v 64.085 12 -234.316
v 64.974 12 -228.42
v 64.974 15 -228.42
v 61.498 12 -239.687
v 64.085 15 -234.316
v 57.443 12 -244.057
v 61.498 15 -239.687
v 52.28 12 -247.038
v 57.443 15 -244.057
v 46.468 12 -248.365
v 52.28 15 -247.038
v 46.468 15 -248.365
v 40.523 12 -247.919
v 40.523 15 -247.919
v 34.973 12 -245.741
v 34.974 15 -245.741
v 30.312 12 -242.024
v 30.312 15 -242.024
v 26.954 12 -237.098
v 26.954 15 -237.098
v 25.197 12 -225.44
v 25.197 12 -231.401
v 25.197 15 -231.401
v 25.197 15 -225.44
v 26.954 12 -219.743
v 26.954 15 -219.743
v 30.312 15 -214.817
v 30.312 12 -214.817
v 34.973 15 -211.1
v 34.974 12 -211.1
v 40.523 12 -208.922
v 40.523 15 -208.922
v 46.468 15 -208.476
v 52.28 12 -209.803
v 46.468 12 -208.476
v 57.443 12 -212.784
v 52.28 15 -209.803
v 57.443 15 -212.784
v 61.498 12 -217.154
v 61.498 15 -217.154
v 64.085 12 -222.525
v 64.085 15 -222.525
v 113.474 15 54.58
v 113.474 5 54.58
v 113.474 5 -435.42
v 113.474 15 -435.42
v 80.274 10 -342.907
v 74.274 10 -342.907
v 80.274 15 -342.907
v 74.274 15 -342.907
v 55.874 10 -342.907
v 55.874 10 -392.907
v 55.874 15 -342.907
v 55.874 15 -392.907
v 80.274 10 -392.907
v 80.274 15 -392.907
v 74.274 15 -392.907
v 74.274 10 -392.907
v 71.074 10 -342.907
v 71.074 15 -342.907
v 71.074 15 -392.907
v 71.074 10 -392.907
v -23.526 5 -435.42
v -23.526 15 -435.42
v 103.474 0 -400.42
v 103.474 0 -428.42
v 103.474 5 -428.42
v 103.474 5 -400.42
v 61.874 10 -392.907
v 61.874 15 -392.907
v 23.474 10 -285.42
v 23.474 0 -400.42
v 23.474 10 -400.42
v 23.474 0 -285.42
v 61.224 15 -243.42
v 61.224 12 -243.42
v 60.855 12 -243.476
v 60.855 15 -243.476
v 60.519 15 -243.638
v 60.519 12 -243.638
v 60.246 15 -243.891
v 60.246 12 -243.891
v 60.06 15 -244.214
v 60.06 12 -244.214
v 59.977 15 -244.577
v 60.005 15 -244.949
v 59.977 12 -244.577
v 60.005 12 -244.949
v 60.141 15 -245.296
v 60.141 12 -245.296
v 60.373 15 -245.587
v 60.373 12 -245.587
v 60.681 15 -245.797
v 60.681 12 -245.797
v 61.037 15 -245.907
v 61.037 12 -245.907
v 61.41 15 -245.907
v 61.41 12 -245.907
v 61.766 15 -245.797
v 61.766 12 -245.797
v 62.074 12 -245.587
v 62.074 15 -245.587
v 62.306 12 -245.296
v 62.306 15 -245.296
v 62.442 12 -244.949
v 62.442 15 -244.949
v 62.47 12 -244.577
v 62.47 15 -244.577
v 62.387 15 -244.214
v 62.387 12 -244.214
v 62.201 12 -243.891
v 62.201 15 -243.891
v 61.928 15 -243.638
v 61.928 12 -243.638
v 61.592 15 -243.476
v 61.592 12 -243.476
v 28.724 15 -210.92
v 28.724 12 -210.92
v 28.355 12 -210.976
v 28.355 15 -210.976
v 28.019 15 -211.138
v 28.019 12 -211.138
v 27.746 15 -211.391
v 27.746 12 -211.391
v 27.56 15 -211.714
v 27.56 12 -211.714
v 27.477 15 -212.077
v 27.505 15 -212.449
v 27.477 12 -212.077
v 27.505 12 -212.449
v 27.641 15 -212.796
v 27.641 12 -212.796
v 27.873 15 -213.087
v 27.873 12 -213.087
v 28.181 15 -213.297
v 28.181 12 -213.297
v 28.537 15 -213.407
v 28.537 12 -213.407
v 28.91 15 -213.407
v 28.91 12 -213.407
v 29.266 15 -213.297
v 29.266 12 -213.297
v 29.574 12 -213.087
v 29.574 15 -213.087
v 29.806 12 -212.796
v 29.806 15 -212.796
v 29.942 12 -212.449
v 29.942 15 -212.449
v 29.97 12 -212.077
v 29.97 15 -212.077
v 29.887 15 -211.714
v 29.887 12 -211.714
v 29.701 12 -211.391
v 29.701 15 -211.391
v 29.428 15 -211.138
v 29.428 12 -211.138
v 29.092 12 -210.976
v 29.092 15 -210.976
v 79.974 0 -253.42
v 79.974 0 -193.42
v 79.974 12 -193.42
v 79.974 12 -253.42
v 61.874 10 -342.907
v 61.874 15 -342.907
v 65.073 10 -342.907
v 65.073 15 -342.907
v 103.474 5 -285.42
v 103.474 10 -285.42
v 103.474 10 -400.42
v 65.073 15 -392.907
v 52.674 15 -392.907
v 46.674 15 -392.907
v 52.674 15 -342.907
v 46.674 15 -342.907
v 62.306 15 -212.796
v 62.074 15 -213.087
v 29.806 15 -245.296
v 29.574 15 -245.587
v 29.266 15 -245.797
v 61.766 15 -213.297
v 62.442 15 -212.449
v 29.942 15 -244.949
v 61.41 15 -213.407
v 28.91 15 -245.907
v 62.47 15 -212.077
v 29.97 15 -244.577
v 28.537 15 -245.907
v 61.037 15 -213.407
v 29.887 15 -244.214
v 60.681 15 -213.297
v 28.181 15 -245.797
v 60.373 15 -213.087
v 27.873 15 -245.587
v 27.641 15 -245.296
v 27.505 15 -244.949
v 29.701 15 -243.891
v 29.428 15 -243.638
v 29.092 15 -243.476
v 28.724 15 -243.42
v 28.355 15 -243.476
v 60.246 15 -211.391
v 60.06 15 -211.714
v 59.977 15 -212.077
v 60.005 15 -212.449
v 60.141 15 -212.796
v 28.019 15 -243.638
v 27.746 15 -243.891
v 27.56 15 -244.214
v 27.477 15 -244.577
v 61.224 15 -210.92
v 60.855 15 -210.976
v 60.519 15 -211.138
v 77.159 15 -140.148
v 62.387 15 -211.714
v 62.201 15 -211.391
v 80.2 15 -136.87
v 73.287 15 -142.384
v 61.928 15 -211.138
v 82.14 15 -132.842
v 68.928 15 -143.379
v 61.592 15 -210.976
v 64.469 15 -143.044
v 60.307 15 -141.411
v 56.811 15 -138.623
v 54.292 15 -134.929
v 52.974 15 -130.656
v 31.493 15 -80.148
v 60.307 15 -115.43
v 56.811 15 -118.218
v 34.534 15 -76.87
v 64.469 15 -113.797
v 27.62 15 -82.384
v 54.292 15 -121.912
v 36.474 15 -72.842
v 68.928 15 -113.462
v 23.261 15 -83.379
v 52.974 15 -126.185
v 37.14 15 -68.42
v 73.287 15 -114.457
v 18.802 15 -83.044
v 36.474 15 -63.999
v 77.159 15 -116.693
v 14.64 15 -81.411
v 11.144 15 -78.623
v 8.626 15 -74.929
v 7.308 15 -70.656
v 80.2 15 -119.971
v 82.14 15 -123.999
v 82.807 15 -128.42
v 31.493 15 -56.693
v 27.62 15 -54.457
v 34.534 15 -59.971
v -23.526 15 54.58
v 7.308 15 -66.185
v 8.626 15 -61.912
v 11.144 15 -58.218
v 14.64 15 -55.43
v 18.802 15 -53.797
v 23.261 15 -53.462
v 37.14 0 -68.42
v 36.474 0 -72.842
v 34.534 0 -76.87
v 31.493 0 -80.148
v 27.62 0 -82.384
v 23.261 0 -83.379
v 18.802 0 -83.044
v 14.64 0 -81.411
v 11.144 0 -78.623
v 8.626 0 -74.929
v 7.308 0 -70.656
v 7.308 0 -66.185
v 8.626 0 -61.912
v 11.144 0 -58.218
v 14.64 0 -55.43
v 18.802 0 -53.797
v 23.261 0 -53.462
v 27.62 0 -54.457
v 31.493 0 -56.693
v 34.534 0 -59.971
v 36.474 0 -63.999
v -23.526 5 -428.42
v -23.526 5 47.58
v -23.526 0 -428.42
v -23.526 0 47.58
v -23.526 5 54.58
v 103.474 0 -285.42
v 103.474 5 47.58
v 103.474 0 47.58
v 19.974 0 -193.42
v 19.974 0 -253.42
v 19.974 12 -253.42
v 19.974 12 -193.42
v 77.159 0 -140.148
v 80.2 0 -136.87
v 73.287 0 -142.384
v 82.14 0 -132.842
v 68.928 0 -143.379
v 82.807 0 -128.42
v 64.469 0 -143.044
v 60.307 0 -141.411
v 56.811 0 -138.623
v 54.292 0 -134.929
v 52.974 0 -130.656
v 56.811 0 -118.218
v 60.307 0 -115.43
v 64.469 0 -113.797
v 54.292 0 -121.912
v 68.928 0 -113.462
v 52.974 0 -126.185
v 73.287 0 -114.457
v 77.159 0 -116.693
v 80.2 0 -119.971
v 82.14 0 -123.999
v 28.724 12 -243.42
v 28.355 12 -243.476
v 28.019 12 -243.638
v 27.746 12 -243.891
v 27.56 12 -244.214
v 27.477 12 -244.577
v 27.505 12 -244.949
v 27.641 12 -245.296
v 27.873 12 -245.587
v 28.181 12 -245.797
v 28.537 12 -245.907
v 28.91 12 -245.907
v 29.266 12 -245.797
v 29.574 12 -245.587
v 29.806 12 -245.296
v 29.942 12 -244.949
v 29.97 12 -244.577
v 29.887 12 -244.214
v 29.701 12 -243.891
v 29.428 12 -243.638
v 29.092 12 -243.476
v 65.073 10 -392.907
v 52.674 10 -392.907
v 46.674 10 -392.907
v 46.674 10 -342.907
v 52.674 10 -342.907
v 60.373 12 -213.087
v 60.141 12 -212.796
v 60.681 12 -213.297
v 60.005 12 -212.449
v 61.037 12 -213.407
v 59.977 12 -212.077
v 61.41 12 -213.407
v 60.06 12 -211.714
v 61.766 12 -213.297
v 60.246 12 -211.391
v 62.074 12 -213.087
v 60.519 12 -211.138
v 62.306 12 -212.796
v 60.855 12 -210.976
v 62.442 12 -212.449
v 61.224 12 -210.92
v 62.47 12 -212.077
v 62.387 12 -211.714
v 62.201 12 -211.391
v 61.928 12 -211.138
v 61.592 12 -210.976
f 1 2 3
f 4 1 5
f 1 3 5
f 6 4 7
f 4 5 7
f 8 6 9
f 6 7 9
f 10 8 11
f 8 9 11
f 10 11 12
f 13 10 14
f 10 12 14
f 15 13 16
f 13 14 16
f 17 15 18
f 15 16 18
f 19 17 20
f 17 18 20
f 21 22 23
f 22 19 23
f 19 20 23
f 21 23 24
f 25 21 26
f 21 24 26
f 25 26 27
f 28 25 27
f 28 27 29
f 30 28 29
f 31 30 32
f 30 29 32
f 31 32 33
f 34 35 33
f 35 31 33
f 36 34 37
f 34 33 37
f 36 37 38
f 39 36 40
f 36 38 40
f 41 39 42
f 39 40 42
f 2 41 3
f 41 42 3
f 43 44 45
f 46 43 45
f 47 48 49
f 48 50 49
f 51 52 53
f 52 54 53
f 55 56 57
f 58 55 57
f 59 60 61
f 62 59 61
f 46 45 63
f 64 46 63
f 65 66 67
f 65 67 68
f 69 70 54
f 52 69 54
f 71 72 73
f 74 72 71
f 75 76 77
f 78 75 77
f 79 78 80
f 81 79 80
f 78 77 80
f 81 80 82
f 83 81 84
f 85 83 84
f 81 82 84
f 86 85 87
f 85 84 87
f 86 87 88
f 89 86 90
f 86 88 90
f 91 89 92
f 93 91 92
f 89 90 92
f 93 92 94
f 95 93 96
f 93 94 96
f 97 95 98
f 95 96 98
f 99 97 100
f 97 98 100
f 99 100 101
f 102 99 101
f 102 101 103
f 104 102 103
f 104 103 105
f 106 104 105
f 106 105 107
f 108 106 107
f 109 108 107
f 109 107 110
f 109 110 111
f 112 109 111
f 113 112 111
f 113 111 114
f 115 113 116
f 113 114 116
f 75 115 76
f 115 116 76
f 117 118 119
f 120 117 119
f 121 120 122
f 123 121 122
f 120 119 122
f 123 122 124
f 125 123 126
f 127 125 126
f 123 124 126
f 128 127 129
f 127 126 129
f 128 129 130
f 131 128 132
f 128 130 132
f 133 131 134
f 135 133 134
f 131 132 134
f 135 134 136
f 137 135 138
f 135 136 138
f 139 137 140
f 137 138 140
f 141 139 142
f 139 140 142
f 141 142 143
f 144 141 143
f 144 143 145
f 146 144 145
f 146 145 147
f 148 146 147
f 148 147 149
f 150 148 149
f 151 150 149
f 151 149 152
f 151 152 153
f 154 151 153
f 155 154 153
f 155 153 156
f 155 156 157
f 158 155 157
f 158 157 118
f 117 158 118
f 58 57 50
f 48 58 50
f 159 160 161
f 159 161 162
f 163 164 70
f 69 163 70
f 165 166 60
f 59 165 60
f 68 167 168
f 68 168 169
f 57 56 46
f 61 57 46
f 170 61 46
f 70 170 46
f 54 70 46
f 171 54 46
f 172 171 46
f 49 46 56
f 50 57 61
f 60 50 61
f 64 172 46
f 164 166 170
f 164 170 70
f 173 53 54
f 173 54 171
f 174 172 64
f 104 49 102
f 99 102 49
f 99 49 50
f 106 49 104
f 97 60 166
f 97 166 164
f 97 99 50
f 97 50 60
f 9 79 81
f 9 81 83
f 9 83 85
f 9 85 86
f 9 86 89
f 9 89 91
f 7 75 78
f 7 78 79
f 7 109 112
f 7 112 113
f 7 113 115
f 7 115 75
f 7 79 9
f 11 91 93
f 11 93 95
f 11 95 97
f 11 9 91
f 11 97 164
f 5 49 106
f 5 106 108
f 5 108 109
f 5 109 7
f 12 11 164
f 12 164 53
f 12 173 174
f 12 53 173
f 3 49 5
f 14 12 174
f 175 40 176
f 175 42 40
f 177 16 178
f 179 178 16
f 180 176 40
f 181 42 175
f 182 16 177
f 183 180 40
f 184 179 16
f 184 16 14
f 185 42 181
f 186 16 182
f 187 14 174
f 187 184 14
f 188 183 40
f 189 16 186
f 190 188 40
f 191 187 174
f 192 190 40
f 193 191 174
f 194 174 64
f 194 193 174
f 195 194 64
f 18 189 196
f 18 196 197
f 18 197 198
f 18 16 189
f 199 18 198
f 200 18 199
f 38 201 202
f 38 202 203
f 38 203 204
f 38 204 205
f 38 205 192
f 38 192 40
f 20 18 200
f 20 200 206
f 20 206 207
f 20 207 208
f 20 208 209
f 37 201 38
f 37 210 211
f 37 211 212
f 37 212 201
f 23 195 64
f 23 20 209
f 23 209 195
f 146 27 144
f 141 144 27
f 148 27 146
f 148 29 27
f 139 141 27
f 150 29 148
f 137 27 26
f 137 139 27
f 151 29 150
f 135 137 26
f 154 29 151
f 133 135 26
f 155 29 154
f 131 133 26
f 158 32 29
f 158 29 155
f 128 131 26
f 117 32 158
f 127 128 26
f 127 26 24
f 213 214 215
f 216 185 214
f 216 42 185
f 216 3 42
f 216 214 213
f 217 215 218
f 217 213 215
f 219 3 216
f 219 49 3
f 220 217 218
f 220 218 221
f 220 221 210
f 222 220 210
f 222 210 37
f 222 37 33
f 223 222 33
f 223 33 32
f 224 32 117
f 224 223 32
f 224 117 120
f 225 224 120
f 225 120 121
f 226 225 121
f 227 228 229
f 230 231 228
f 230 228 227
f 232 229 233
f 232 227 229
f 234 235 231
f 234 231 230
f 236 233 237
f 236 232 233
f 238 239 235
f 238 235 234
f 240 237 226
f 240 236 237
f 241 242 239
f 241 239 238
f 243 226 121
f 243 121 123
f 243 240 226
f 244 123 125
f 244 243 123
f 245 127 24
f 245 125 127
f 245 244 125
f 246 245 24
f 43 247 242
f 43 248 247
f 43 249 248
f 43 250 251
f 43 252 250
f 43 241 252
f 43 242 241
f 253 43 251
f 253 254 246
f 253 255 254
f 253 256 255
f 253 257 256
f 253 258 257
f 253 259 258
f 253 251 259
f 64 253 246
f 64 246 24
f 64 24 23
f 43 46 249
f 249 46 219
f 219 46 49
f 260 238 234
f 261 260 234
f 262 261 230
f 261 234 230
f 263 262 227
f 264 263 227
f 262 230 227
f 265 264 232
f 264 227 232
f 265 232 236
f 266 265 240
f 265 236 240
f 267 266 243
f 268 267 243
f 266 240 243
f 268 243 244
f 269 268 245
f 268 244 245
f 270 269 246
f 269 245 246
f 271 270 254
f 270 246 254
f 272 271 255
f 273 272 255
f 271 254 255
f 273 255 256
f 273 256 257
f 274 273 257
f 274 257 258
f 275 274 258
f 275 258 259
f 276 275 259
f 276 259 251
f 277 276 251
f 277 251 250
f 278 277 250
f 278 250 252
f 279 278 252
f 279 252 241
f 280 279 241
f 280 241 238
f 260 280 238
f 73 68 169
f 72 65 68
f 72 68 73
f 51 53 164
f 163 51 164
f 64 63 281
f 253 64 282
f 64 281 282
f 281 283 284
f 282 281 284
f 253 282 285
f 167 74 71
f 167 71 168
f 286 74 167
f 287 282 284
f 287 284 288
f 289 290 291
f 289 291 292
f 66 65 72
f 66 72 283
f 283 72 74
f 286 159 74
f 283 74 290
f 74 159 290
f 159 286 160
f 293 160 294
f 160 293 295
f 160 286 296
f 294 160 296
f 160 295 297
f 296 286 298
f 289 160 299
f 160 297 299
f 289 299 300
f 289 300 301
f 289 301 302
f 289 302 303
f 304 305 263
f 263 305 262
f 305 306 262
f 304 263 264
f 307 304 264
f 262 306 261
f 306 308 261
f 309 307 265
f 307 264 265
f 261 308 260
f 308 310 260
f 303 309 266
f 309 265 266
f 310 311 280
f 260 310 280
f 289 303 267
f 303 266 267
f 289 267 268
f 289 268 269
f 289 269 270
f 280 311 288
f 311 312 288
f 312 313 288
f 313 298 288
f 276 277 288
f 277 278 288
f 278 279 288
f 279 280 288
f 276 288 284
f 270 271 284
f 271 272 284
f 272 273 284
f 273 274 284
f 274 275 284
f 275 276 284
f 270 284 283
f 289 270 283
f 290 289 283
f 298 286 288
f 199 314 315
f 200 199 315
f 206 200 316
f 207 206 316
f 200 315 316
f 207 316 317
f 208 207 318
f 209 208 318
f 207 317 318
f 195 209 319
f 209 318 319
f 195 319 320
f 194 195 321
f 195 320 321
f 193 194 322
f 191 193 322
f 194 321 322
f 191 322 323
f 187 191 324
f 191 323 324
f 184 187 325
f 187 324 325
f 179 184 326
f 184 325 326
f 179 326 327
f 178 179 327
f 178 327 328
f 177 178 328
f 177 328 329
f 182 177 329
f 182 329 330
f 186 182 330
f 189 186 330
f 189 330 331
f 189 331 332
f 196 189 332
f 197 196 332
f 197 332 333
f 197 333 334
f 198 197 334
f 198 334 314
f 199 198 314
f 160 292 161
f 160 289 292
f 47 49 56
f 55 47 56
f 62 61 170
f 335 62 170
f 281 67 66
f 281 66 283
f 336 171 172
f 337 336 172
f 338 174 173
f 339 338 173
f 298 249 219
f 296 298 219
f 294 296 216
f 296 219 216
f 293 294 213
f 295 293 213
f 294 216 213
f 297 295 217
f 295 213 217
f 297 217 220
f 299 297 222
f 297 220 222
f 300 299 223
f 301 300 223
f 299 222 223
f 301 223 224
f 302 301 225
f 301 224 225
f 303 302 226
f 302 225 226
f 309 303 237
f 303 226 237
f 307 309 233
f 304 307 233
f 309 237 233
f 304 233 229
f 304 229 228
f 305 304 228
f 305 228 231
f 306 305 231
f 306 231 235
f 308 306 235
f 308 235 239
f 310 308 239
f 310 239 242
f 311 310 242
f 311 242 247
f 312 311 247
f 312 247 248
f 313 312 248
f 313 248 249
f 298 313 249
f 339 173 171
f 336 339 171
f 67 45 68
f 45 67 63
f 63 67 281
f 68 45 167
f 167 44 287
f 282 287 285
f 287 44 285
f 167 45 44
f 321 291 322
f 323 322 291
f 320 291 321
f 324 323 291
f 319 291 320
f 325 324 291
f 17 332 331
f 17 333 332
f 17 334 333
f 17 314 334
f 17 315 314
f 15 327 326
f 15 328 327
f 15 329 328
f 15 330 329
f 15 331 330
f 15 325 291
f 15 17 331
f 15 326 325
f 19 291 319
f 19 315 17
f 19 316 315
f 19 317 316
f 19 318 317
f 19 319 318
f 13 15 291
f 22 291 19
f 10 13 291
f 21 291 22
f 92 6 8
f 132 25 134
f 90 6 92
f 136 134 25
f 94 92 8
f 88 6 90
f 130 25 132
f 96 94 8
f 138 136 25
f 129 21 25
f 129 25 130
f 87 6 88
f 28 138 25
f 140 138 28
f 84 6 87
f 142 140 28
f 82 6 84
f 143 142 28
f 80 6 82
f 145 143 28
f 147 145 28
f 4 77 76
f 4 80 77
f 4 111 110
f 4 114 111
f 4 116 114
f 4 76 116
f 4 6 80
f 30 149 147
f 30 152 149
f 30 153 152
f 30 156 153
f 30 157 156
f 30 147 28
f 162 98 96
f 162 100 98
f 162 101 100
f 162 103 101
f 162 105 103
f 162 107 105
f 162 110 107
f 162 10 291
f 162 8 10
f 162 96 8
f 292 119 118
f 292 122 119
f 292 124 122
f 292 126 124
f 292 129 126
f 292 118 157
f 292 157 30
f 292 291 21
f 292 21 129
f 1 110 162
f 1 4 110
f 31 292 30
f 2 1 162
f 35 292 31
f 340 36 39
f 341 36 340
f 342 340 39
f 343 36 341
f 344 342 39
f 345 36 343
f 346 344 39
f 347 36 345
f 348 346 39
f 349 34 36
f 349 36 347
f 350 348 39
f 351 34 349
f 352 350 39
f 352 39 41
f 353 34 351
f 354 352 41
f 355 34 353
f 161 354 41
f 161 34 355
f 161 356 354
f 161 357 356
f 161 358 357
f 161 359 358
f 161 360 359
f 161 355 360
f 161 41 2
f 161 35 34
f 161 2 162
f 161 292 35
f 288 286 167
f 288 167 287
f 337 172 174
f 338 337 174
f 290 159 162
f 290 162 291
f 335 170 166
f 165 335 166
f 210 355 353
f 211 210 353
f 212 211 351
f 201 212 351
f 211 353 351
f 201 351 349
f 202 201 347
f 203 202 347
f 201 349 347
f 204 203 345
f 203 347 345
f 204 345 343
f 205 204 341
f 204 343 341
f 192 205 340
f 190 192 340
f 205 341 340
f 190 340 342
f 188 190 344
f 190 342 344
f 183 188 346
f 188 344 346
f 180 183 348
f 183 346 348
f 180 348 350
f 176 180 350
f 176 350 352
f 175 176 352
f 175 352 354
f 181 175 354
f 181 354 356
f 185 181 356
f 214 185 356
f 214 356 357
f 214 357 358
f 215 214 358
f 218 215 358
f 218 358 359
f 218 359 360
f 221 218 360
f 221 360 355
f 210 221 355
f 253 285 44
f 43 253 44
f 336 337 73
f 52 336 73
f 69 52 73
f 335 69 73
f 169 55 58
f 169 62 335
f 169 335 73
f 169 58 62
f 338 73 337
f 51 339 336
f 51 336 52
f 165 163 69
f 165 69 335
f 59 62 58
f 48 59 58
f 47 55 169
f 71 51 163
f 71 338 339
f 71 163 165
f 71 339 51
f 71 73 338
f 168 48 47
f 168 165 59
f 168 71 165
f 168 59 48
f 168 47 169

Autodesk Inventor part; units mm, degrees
ref_plane "YZ Plane" through (0, 0, 0) normal (1, 0, 0) x (0, 1, 0)
ref_plane "XZ Plane" through (0, 0, 0) normal (0, 1, 0) x (-1, 0, 0)
ref_plane "XY Plane" through (0, 0, 0) normal (0, 0, 1) x (1, 0, 0)
sketch "Sketch1" plane through (0, 0, 0) normal (0, 1, 0) x (-1, 0, 0)
  line L0 (23.5265, 54.5795) -> (-113.4735, 54.5795)
  line L1 (-113.4735, 54.5795) -> (-113.4735, -435.4205)
  line L2 (-113.4735, -435.4205) -> (23.5265, -435.4205)
  line L3 (23.5265, -435.4205) -> (23.5265, 54.5795)
  point P0 (0, 0)
  dimension "d0" = 137
  dimension "d1" = 490
extrude "Extrusion1" add sketch "Sketch1" along normal blind 15
sketch "Sketch2" plane through (-23.5265, 0, 54.5795) normal (0, 0, 1) x (1, 0, 0)
  line L0 (137, 0) -> (0, 0) projected
  line L1 (0, 0) -> (127, 0)
  line L2 (127, 0) -> (127, 5)
  line L3 (127, 5) -> (0, 5)
  line L4 (0, 5) -> (0, 0)
  point P0 (23.5265, 0)
  dimension "d4" = 127
  dimension "d5" = 5
extrude "Extrusion2" cut sketch "Sketch2" against normal blind 7
sketch "Sketch3" plane through (113.4735, 0, -435.4205) normal (0, 0, -1) x (-1, 0, 0)
  line L0 (0, 0) -> (137, 0) projected
  line L1 (0, 0) -> (137, 0)
  line L2 (137, 0) -> (137, 5)
  line L3 (137, 5) -> (0, 5)
  line L4 (0, 5) -> (0, 0)
  point P0 (113.4735, 0)
  dimension "d8" = 137
  dimension "d9" = 5
extrude "Extrusion3" cut sketch "Sketch3" against normal blind 7
sketch "Sketch4" plane through (0, 0, 0) normal (0, -1, 0) x (1, 0, 0)
  line L0 (-23.5265, -428.4205) -> (113.4735, -428.4205) projected
  line L1 (103.4735, 47.5795) -> (-23.5265, 47.5795) projected
  line L2 (113.4735, -428.4205) -> (103.4735, -428.4205)
  line L3 (103.4735, -428.4205) -> (103.4735, 47.5795)
  line L4 (103.4735, 47.5795) -> (113.4735, 47.5795)
  line L5 (113.4735, 47.5795) -> (113.4735, -428.4205)
  point P0 (0, 0)
  point P1 (-13.5265, -428.4205)
  dimension "d12" = 10
  dimension "d13" = 476
extrude "Extrusion4" cut sketch "Sketch4" against normal blind 5
sketch "Sketch5" plane through (0, 15, 0) normal (0, 1, 0) x (1, 0, 0)
  circle A0 centre (22.1402, 68.4205) radius 15
  circle A1 centre (67.8068, 128.4205) radius 15
  circle A2 centre (44.9735, 228.4205) radius 20
  line L0 (103.4735, 428.4205) -> (-23.5265, 428.4205) projected
  line L1 (-23.5265, 435.4205) -> (-23.5265, -54.5795) projected
  point P0 (0, 0)
  point P1 (-13.5265, 428.4205)
  dimension "d16" = 40
  dimension "d17" = 200
  dimension "d18" = 68.5
  dimension "d19" = 300
  dimension "d20" = 91.3333
  dimension "d21" = 45.6667
  dimension "d22" = 360
  dimension "d23" = 30
  dimension "d24" = 30
extrude "Extrusion5" cut sketch "Sketch5" against normal blind 15
sketch "Sketch6" plane through (0, 0, 0) normal (0, -1, 0) x (1, 0, 0)
  line L0 (69.9735, -253.4205) -> (19.9735, -253.4205)
  line L1 (19.9735, -253.4205) -> (19.9735, -203.4205)
  line L2 (19.9735, -203.4205) -> (69.9735, -203.4205)
  line L3 (69.9735, -203.4205) -> (69.9735, -253.4205)
  circle A0 centre (44.9735, -228.4205) radius 20 projected
  point P0 (0, 0)
  dimension "d27" = 25
  dimension "d28" = 50
  dimension "d29" = 25
  dimension "d30" = 50
extrude "Extrusion6" cut sketch "Sketch6" against normal blind 12
sketch "Sketch7" plane through (0, 15, 0) normal (0, 1, 0) x (1, 0, 0)
  circle A0 centre (44.9735, 228.4205) radius 20 projected
  point P0 (0, 0)
  point P1 (28.7235, 212.1705)
  point P2 (28.7235, 244.6705)
  point P3 (61.2235, 244.6705)
  point P4 (61.2235, 212.1705)
  dimension "d33" = 16.25
  dimension "d34" = 16.25
  dimension "d35" = 16.25
  dimension "d36" = 16.25
  dimension "d37" = 16.25
  dimension "d38" = 16.25
  dimension "d39" = 16.25
  dimension "d40" = 16.25
hole "Hole1" at (28.7235, 15, -212.1705) at (28.7235, 15, -244.6705) at (61.2235, 15, -244.6705) at (61.2235, 15, -212.1705) direction (0, -1, 0) diameter 2.5 end through all
sketch "Sketch8" plane through (0, 0, 0) normal (0, -1, 0) x (1, 0, 0)
  circle A0 centre (61.2235, -244.6705) radius 1.25 projected
  circle A1 centre (28.7235, -212.1705) radius 1.25 projected
  circle A2 centre (28.7235, -244.6705) radius 1.25 projected
  circle A3 centre (61.2235, -212.1705) radius 1.25 projected
  line L0 (19.9735, -203.4205) -> (69.9735, -203.4205) projected
  line L1 (19.9735, -253.4205) -> (19.9735, -203.4205) projected
  line L2 (69.9735, -253.4205) -> (19.9735, -253.4205) projected
  line L3 (69.9735, -203.4205) -> (69.9735, -253.4205) projected
  circle A4 centre (44.9735, -228.4205) radius 20 projected
  line L4 (69.9735, -203.4205) -> (69.9735, -253.4205) projected
  line L5 (69.9735, -253.4205) -> (79.9735, -253.4205)
  line L6 (79.9735, -253.4205) -> (79.9735, -203.4205)
  line L7 (79.9735, -203.4205) -> (69.9735, -203.4205)
  line L8 (69.9735, -203.4205) -> (69.9735, -253.4205)
  line L9 (79.9735, -203.4205) -> (19.9735, -203.4205)
  line L10 (19.9735, -203.4205) -> (19.9735, -193.4205)
  line L11 (19.9735, -193.4205) -> (79.9735, -193.4205)
  line L12 (79.9735, -193.4205) -> (79.9735, -203.4205)
  point P0 (0, 0)
  dimension "d48" = 10
  dimension "d49" = 50
  dimension "d50" = 60
  dimension "d51" = 10
extrude "Extrusion7" cut sketch "Sketch8" against normal blind 12 contours L10 L11 L12 L7 L0 | L7 L6 L5 L3
sketch "Sketch9" plane through (0, 15, 0) normal (0, 1, 0) x (1, 0, 0)
  line L0 (43.4735, 338.4205) -> (83.4735, 338.4205)
  line L1 (83.4735, 338.4205) -> (83.4735, 398.4205)
  line L2 (83.4735, 398.4205) -> (43.4735, 398.4205)
  line L3 (43.4735, 398.4205) -> (43.4735, 338.4205)
  line L4 (103.4735, 428.4205) -> (-23.5265, 428.4205) projected
  line L5 (113.4735, -54.5795) -> (113.4735, 435.4205) projected
  line L6 (46.6735, 342.9072) -> (52.6735, 342.9072)
  line L7 (52.6735, 342.9072) -> (52.6735, 392.9072)
  line L8 (52.6735, 392.9072) -> (46.6735, 392.9072)
  line L9 (46.6735, 392.9072) -> (46.6735, 342.9072)
  line L10 (55.8735, 342.9072) -> (61.8735, 342.9072)
  line L11 (61.8735, 342.9072) -> (61.8735, 392.9072)
  line L12 (61.8735, 392.9072) -> (55.8735, 392.9072)
  line L13 (55.8735, 392.9072) -> (55.8735, 342.9072)
  line L14 (65.0735, 342.9072) -> (71.0735, 342.9072)
  line L15 (71.0735, 342.9072) -> (71.0735, 392.9072)
  line L16 (71.0735, 392.9072) -> (65.0735, 392.9072)
  line L17 (65.0735, 392.9072) -> (65.0735, 342.9072)
  line L18 (74.2735, 342.9072) -> (80.2735, 342.9072)
  line L19 (80.2735, 342.9072) -> (80.2735, 392.9072)
  line L20 (80.2735, 392.9072) -> (74.2735, 392.9072)
  line L21 (74.2735, 392.9072) -> (74.2735, 342.9072)
  point P0 (0, 0)
  point P1 (-13.5265, 428.4205)
  dimension "d54" = 60
  dimension "d55" = 40
  dimension "d56" = 30
  dimension "d57" = 30
  dimension "d58" = 50
  dimension "d59" = 50
  dimension "d60" = 6
  dimension "d61" = 6
  dimension "d62" = 6
  dimension "d63" = 6
  dimension "d64" = 3.2
  dimension "d65" = 3.2
  dimension "d66" = 3.2
  dimension "d67" = 3.2
extrude "Extrusion8" cut sketch "Sketch9" against normal blind 15 contours L9 L8 L7 L6 | L13 L12 L11 L10 | L17 L16 L15 L14 | L21 L20 L19 L18
sketch "Sketch11" plane through (0, 0, 0) normal (0, -1, 0) x (1, 0, 0)
  line L0 (103.4735, -400.4205) -> (23.4735, -400.4205)
  line L1 (23.4735, -400.4205) -> (23.4735, -285.4205)
  line L2 (23.4735, -285.4205) -> (103.4735, -285.4205)
  line L3 (103.4735, -285.4205) -> (103.4735, -400.4205)
  line L4 (113.4735, 47.5795) -> (113.4735, -435.4205) projected
  line L5 (113.4735, -435.4205) -> (-23.5265, -435.4205) projected
  point P0 (0, 0)
  point P1 (-13.5265, -435.4205)
  dimension "d70" = 80
  dimension "d71" = 115
  dimension "d72" = 10
  dimension "d73" = 35
extrude "Extrusion9" cut sketch "Sketch11" against normal blind 10
sketch "Sketch12" plane through (-23.5265, 15, 54.5795) normal (0, 0, 1) x (1, 0, 0)
  line L0 (0, 0) -> (137, 0) projected
  line L1 (137, -121) -> (137, 0) projected
  line L2 (127, -15) -> (137, -15) projected
  line L3 (127, -10) -> (127, -121) projected
  line L4 (0, -10) -> (127, -10) projected
  line L5 (127, -10) -> (127, -121) projected
  line L6 (0, -10) -> (127, -10) projected
  line L7 (137, -15) -> (137, -10) projected
  line L8 (127, -10) -> (137, -10)
  line L9 (137, -10) -> (137, -15)
  line L10 (137, -15) -> (127, -15)
  line L11 (127, -15) -> (127, -10)
  point P0 (23.5265, -15)
extrude "Extrusion10" cut sketch "Sketch12" against normal blind 7
properties part number "Arcade_ControlTop"
